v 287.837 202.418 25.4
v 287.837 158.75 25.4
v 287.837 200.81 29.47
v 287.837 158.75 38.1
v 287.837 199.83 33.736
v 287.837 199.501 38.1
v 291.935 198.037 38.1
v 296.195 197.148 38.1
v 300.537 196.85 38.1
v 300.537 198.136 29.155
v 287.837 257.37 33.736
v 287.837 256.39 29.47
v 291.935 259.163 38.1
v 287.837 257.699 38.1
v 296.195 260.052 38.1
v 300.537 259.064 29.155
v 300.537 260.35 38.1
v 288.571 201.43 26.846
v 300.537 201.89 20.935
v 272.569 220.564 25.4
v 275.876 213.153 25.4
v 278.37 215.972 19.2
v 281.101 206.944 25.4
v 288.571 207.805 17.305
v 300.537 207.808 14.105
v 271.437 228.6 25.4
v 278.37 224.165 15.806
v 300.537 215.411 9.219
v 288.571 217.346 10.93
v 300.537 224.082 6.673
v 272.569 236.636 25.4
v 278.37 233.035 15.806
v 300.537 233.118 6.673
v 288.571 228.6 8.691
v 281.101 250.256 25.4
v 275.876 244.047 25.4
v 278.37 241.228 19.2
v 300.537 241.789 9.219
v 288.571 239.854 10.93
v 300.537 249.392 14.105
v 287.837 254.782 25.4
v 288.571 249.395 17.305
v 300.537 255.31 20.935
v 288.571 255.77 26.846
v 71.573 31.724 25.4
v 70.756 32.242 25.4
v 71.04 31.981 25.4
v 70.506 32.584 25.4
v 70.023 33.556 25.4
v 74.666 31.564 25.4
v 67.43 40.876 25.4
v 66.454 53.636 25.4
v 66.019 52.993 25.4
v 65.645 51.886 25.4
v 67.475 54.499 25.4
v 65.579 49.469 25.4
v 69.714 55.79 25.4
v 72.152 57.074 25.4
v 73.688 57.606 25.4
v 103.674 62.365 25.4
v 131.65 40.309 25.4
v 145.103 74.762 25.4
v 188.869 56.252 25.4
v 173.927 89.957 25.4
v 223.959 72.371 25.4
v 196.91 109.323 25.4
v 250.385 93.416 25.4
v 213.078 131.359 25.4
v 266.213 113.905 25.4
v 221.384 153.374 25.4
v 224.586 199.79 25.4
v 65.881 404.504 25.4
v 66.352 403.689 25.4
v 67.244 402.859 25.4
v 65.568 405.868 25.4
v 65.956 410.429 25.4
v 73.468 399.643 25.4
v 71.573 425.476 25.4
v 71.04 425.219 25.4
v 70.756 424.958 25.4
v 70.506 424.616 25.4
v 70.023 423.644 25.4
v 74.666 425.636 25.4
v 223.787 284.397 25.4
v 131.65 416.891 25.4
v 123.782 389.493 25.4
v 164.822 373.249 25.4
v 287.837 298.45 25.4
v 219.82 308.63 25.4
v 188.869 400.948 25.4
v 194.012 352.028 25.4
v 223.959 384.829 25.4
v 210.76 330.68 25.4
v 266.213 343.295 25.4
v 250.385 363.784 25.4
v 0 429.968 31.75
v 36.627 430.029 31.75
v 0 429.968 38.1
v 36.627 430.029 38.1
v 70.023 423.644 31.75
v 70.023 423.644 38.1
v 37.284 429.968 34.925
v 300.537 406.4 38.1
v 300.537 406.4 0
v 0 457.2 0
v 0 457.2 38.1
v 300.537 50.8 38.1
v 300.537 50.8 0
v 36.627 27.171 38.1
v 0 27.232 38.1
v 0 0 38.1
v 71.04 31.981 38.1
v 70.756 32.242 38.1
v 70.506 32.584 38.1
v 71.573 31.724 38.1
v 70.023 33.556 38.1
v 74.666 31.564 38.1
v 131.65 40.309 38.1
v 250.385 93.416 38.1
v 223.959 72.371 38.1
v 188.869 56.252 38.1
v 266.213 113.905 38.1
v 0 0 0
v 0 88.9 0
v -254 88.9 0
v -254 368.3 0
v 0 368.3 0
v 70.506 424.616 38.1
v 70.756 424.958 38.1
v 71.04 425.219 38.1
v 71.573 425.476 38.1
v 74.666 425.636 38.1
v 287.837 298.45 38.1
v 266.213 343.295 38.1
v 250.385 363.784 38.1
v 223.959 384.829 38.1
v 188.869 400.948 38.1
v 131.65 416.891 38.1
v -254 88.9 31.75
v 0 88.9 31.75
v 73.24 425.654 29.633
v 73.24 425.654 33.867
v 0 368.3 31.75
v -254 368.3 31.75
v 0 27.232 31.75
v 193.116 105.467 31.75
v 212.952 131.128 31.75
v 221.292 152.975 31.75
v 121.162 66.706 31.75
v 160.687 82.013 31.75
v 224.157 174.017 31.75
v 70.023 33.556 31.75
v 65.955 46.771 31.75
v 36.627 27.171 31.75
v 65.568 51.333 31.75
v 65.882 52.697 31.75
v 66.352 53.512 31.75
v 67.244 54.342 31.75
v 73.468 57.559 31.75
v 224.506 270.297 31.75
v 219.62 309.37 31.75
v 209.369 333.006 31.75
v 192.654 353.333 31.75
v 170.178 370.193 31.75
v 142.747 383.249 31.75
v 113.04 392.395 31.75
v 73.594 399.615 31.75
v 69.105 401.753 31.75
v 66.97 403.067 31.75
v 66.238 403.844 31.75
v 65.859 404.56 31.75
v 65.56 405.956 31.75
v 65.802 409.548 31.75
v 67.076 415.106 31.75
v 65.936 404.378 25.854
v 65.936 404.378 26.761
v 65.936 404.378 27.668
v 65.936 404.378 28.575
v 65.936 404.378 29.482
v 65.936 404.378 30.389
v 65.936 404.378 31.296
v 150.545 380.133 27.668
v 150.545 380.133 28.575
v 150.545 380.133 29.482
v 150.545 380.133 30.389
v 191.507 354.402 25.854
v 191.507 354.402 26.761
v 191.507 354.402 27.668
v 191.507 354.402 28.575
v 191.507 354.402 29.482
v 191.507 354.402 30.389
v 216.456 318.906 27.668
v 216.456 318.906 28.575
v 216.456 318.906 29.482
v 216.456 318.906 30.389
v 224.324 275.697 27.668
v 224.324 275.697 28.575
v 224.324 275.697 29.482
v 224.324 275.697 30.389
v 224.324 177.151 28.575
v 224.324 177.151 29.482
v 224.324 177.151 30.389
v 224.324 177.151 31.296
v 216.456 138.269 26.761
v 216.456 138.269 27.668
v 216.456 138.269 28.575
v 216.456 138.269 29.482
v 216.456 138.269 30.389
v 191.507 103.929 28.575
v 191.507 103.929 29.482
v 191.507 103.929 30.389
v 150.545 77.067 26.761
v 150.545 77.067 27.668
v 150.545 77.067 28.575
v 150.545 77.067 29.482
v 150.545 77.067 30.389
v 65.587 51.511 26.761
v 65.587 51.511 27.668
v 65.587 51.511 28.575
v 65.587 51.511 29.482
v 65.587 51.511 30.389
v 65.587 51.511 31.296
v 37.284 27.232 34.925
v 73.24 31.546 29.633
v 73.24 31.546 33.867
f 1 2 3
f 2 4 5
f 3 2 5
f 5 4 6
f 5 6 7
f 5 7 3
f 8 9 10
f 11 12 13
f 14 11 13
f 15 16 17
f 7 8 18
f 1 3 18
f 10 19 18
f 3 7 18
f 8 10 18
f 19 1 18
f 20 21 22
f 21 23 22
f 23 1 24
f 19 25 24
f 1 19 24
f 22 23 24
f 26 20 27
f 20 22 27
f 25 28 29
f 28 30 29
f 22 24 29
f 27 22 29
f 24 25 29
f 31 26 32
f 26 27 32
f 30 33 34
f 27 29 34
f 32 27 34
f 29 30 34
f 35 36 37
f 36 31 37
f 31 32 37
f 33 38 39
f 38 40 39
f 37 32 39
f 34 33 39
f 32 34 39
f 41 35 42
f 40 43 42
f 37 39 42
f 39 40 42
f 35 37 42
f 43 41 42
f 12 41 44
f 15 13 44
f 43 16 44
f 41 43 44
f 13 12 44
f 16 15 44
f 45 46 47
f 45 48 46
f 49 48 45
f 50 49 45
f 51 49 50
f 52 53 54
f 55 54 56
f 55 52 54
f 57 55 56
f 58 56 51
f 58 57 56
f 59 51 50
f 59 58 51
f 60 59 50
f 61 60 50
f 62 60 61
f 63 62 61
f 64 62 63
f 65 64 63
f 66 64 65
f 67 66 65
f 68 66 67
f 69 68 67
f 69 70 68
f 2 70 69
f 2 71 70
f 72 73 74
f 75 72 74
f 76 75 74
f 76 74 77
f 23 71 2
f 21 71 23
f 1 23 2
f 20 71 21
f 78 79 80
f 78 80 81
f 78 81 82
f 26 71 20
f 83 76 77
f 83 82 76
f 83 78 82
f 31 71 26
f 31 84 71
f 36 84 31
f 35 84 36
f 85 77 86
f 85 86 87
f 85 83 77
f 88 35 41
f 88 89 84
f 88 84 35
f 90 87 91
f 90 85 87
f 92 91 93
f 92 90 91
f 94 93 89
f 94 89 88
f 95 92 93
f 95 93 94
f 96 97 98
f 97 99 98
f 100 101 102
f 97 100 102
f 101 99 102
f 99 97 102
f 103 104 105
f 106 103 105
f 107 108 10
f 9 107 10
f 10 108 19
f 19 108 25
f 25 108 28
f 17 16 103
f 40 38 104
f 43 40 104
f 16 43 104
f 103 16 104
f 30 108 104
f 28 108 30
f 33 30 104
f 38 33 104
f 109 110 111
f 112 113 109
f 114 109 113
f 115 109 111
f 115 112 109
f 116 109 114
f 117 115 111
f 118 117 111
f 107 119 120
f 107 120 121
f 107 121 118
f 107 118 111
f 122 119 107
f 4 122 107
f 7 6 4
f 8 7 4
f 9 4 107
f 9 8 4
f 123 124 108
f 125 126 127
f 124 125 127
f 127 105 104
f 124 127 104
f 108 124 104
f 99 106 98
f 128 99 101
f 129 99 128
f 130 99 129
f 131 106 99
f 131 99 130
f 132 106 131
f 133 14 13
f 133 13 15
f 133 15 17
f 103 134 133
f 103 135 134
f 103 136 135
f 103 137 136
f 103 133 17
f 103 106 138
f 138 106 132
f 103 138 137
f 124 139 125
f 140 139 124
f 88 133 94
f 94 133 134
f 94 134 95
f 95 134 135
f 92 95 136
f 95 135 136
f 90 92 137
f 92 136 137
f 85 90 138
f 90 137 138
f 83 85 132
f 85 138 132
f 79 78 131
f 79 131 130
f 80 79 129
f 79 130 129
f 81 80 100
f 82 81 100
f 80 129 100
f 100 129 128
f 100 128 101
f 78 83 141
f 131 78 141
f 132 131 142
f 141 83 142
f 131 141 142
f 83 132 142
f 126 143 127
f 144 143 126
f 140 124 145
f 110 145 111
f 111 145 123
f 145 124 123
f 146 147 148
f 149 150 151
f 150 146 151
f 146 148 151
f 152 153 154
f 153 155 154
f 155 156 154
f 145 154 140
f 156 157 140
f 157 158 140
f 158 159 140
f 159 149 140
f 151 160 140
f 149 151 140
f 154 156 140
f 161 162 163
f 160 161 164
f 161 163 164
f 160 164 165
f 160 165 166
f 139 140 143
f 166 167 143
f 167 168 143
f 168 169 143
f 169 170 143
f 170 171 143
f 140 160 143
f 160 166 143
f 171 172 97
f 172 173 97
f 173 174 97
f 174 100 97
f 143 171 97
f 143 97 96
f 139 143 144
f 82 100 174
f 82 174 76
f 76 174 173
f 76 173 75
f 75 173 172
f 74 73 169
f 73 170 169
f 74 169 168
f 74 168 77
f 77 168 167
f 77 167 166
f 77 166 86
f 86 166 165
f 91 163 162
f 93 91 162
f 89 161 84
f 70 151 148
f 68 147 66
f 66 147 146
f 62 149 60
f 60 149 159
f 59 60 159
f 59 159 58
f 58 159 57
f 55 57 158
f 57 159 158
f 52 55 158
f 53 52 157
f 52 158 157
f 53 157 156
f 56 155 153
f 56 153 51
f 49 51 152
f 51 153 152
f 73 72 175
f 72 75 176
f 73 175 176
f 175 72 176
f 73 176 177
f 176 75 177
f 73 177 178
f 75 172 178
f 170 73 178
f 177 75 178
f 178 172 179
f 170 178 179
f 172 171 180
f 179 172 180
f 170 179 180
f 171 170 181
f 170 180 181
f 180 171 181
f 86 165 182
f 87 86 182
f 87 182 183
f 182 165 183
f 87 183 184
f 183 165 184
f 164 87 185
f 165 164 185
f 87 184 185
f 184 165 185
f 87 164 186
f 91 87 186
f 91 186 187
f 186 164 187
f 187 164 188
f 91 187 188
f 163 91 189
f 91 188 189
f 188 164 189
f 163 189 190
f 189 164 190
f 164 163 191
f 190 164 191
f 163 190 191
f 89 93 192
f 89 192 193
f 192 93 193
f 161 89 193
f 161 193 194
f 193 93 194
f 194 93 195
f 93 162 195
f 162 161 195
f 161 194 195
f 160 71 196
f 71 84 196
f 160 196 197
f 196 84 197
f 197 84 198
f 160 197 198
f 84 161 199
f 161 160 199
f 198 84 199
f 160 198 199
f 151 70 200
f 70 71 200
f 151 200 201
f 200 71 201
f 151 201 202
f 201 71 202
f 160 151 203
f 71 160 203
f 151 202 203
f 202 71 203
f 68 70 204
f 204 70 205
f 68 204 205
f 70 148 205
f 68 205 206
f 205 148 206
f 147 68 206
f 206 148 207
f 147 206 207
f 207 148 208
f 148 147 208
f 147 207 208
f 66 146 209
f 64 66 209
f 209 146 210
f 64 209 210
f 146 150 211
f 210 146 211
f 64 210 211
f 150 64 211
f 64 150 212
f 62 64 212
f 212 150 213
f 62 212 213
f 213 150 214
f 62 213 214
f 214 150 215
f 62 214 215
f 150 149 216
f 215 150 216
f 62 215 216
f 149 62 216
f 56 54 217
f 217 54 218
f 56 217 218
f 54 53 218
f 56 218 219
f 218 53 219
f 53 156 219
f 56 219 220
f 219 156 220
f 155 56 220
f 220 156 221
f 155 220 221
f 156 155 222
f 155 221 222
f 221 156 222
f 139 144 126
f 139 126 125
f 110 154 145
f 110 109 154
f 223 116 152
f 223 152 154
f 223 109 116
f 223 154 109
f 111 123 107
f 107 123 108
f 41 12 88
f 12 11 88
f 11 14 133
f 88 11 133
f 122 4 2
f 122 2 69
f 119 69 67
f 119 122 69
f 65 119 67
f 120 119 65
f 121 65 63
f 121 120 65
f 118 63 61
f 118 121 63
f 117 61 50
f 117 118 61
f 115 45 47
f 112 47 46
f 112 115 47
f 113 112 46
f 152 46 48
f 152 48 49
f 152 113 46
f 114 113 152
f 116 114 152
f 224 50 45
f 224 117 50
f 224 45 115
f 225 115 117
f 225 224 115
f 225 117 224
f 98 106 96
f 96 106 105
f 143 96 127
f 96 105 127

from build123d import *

# Parameters (mm, degrees)
F1_DEPTH = 38.1
F3_DEPTH = 12.7
F5_ANGLE = 180
F6_DEPTH = 6.35
F8_DEPTH = 31.75


with BuildPart() as f1:
    # F0 (on Top) → F1 (new body)
    with BuildSketch(Plane.XY):
        Polygon((0, 457.2), (0, 0), (300.5368529815, 50.8), (300.5368529815, 406.4), align=None)
    extrude(amount=F1_DEPTH)

    # F2 (on face) → F3 (cut)
    with BuildSketch(Plane.XY.offset(38.1)):
        with BuildLine():
            Line((287.8368529815, 158.75), (287.8368529815, 228.6))
            Line((287.8368529815, 228.6), (287.8368529815, 298.45))
            add(Edge.make_bspline(
                [(287.8368529815, 298.45), (274.0976885543, 331.7129114168), (244.462232063, 403.4612317728), (73.3301440344, 427.7271384352), (70.74195792, 425.2940959796), (70.0230365024, 423.6438925683)],
                knots=[0, 0, 0, 0, 0.1680777292, 0.3625447701, 0.3933937659, 0.3933937659, 0.3933937659, 0.3933937659], degree=3))
            add(Edge.make_bspline(
                [(70.0230365024, 423.6438925683), (68.4355376678, 419.9999671984), (63.377452963, 404.8697109281), (68.3702936505, 402.2079819696), (73.2398539672, 399.3490471662), (77.3060373008, 399.9323880306), (160.4823825419, 386.0696943096), (229.5400089317, 324.4485337175), (224.3368529815, 260.4551017284), (224.3368529815, 228.6)],
                knots=[0.3933937659, 0.3933937659, 0.3933937659, 0.3933937659, 0.4615135128, 0.495784539, 0.5311346164, 0.5602485234, 0.6989412506, 0.848957098, 1, 1, 1, 1], degree=3))
            add(Edge.make_bspline(
                [(70.0230365024, 33.5561074317), (68.4355376678, 37.1999006103), (63.377452963, 52.3292730677), (68.3702936505, 54.9937890625), (73.2398539672, 57.8444840887), (77.3060373008, 57.3174367131), (160.4823825419, 70.0436920791), (229.5400089317, 136.9971102414), (224.3368529815, 187.5921785831), (224.3368529815, 228.6)],
                knots=[0.3933937659, 0.3933937659, 0.3933937659, 0.3933937659, 0.4615135128, 0.495784539, 0.5311346164, 0.5602485234, 0.6989412506, 0.848957098, 1, 1, 1, 1], degree=3))
            add(Edge.make_bspline(
                [(287.8368529815, 158.75), (274.0976885543, 125.4870885832), (244.462232063, 53.7388397395), (73.3301440344, 29.4726759186), (70.74195792, 31.9059638852), (70.0230365024, 33.5561074317)],
                knots=[0, 0, 0, 0, 0.1680777292, 0.3625447701, 0.3933937659, 0.3933937659, 0.3933937659, 0.3933937659], degree=3))
        make_face()
    extrude(amount=-F3_DEPTH, mode=Mode.SUBTRACT)

    # F4 (on face) → F5 (revolve, cut)
    with BuildSketch(Plane.XY.offset(38.1)):
        with BuildLine():
            ThreePointArc((268.7868529815, 228.6), (278.0862126788, 206.1493596973), (300.5368529815, 196.85))
            Line((300.5368529815, 196.85), (300.5368529815, 228.6))
            Line((300.5368529815, 228.6), (268.7868529815, 228.6))
        make_face()
    revolve(axis=Axis((284.6618529815, 228.6, 38.1), (1, 0, 0)), revolution_arc=F5_ANGLE, mode=Mode.SUBTRACT)

    # F2 (on face) → F6 (cut)
    with BuildSketch(Plane.XY.offset(38.1)):
        with BuildLine():
            add(Edge.make_bspline(
                [(70.0230365024, 33.5561074317), (59.3142063381, 30.9359426227), (37.2815163913, 25.5451316791), (12.6563049092, 26.6596121467), (0, 27.2324074148)],
                knots=[0, 0, 0, 0, 0.4860427932, 1, 1, 1, 1], degree=3))
            add(Edge.make_bspline(
                [(70.0230365024, 33.5561074317), (68.4355376678, 37.1999006103), (63.377452963, 52.3292730677), (68.3702936505, 54.9937890625), (73.2398539672, 57.8444840887), (77.3060373008, 57.3174367131), (160.4823825419, 70.0436920791), (229.5400089317, 136.9971102414), (224.3368529815, 187.5921785831), (224.3368529815, 228.6)],
                knots=[0.3933937659, 0.3933937659, 0.3933937659, 0.3933937659, 0.4615135128, 0.495784539, 0.5311346164, 0.5602485234, 0.6989412506, 0.848957098, 1, 1, 1, 1], degree=3))
            add(Edge.make_bspline(
                [(70.0230365024, 423.6438925683), (68.4355376678, 419.9999671984), (63.377452963, 404.8697109281), (68.3702936505, 402.2079819696), (73.2398539672, 399.3490471662), (77.3060373008, 399.9323880306), (160.4823825419, 386.0696943096), (229.5400089317, 324.4485337175), (224.3368529815, 260.4551017284), (224.3368529815, 228.6)],
                knots=[0.3933937659, 0.3933937659, 0.3933937659, 0.3933937659, 0.4615135128, 0.495784539, 0.5311346164, 0.5602485234, 0.6989412506, 0.848957098, 1, 1, 1, 1], degree=3))
            add(Edge.make_bspline(
                [(70.0230365024, 423.6438925683), (59.3142063381, 426.2640573773), (37.2815163913, 431.6548683209), (12.6563049092, 430.5403878533), (0, 429.9675925852)],
                knots=[0, 0, 0, 0, 0.4860427932, 1, 1, 1, 1], degree=3))
            Line((0, 429.9675925852), (0, 27.2324074148))
        make_face()
    extrude(amount=-F6_DEPTH, mode=Mode.SUBTRACT)

    # F7 (on face) → F8 (join)
    with BuildSketch(Plane.XY.offset(31.75)):
        Polygon((0, 228.6), (0, 368.3), (-254, 368.3), (-254, 88.9), (0, 88.9), align=None)
    extrude(amount=-F8_DEPTH)


solid = f1.part
